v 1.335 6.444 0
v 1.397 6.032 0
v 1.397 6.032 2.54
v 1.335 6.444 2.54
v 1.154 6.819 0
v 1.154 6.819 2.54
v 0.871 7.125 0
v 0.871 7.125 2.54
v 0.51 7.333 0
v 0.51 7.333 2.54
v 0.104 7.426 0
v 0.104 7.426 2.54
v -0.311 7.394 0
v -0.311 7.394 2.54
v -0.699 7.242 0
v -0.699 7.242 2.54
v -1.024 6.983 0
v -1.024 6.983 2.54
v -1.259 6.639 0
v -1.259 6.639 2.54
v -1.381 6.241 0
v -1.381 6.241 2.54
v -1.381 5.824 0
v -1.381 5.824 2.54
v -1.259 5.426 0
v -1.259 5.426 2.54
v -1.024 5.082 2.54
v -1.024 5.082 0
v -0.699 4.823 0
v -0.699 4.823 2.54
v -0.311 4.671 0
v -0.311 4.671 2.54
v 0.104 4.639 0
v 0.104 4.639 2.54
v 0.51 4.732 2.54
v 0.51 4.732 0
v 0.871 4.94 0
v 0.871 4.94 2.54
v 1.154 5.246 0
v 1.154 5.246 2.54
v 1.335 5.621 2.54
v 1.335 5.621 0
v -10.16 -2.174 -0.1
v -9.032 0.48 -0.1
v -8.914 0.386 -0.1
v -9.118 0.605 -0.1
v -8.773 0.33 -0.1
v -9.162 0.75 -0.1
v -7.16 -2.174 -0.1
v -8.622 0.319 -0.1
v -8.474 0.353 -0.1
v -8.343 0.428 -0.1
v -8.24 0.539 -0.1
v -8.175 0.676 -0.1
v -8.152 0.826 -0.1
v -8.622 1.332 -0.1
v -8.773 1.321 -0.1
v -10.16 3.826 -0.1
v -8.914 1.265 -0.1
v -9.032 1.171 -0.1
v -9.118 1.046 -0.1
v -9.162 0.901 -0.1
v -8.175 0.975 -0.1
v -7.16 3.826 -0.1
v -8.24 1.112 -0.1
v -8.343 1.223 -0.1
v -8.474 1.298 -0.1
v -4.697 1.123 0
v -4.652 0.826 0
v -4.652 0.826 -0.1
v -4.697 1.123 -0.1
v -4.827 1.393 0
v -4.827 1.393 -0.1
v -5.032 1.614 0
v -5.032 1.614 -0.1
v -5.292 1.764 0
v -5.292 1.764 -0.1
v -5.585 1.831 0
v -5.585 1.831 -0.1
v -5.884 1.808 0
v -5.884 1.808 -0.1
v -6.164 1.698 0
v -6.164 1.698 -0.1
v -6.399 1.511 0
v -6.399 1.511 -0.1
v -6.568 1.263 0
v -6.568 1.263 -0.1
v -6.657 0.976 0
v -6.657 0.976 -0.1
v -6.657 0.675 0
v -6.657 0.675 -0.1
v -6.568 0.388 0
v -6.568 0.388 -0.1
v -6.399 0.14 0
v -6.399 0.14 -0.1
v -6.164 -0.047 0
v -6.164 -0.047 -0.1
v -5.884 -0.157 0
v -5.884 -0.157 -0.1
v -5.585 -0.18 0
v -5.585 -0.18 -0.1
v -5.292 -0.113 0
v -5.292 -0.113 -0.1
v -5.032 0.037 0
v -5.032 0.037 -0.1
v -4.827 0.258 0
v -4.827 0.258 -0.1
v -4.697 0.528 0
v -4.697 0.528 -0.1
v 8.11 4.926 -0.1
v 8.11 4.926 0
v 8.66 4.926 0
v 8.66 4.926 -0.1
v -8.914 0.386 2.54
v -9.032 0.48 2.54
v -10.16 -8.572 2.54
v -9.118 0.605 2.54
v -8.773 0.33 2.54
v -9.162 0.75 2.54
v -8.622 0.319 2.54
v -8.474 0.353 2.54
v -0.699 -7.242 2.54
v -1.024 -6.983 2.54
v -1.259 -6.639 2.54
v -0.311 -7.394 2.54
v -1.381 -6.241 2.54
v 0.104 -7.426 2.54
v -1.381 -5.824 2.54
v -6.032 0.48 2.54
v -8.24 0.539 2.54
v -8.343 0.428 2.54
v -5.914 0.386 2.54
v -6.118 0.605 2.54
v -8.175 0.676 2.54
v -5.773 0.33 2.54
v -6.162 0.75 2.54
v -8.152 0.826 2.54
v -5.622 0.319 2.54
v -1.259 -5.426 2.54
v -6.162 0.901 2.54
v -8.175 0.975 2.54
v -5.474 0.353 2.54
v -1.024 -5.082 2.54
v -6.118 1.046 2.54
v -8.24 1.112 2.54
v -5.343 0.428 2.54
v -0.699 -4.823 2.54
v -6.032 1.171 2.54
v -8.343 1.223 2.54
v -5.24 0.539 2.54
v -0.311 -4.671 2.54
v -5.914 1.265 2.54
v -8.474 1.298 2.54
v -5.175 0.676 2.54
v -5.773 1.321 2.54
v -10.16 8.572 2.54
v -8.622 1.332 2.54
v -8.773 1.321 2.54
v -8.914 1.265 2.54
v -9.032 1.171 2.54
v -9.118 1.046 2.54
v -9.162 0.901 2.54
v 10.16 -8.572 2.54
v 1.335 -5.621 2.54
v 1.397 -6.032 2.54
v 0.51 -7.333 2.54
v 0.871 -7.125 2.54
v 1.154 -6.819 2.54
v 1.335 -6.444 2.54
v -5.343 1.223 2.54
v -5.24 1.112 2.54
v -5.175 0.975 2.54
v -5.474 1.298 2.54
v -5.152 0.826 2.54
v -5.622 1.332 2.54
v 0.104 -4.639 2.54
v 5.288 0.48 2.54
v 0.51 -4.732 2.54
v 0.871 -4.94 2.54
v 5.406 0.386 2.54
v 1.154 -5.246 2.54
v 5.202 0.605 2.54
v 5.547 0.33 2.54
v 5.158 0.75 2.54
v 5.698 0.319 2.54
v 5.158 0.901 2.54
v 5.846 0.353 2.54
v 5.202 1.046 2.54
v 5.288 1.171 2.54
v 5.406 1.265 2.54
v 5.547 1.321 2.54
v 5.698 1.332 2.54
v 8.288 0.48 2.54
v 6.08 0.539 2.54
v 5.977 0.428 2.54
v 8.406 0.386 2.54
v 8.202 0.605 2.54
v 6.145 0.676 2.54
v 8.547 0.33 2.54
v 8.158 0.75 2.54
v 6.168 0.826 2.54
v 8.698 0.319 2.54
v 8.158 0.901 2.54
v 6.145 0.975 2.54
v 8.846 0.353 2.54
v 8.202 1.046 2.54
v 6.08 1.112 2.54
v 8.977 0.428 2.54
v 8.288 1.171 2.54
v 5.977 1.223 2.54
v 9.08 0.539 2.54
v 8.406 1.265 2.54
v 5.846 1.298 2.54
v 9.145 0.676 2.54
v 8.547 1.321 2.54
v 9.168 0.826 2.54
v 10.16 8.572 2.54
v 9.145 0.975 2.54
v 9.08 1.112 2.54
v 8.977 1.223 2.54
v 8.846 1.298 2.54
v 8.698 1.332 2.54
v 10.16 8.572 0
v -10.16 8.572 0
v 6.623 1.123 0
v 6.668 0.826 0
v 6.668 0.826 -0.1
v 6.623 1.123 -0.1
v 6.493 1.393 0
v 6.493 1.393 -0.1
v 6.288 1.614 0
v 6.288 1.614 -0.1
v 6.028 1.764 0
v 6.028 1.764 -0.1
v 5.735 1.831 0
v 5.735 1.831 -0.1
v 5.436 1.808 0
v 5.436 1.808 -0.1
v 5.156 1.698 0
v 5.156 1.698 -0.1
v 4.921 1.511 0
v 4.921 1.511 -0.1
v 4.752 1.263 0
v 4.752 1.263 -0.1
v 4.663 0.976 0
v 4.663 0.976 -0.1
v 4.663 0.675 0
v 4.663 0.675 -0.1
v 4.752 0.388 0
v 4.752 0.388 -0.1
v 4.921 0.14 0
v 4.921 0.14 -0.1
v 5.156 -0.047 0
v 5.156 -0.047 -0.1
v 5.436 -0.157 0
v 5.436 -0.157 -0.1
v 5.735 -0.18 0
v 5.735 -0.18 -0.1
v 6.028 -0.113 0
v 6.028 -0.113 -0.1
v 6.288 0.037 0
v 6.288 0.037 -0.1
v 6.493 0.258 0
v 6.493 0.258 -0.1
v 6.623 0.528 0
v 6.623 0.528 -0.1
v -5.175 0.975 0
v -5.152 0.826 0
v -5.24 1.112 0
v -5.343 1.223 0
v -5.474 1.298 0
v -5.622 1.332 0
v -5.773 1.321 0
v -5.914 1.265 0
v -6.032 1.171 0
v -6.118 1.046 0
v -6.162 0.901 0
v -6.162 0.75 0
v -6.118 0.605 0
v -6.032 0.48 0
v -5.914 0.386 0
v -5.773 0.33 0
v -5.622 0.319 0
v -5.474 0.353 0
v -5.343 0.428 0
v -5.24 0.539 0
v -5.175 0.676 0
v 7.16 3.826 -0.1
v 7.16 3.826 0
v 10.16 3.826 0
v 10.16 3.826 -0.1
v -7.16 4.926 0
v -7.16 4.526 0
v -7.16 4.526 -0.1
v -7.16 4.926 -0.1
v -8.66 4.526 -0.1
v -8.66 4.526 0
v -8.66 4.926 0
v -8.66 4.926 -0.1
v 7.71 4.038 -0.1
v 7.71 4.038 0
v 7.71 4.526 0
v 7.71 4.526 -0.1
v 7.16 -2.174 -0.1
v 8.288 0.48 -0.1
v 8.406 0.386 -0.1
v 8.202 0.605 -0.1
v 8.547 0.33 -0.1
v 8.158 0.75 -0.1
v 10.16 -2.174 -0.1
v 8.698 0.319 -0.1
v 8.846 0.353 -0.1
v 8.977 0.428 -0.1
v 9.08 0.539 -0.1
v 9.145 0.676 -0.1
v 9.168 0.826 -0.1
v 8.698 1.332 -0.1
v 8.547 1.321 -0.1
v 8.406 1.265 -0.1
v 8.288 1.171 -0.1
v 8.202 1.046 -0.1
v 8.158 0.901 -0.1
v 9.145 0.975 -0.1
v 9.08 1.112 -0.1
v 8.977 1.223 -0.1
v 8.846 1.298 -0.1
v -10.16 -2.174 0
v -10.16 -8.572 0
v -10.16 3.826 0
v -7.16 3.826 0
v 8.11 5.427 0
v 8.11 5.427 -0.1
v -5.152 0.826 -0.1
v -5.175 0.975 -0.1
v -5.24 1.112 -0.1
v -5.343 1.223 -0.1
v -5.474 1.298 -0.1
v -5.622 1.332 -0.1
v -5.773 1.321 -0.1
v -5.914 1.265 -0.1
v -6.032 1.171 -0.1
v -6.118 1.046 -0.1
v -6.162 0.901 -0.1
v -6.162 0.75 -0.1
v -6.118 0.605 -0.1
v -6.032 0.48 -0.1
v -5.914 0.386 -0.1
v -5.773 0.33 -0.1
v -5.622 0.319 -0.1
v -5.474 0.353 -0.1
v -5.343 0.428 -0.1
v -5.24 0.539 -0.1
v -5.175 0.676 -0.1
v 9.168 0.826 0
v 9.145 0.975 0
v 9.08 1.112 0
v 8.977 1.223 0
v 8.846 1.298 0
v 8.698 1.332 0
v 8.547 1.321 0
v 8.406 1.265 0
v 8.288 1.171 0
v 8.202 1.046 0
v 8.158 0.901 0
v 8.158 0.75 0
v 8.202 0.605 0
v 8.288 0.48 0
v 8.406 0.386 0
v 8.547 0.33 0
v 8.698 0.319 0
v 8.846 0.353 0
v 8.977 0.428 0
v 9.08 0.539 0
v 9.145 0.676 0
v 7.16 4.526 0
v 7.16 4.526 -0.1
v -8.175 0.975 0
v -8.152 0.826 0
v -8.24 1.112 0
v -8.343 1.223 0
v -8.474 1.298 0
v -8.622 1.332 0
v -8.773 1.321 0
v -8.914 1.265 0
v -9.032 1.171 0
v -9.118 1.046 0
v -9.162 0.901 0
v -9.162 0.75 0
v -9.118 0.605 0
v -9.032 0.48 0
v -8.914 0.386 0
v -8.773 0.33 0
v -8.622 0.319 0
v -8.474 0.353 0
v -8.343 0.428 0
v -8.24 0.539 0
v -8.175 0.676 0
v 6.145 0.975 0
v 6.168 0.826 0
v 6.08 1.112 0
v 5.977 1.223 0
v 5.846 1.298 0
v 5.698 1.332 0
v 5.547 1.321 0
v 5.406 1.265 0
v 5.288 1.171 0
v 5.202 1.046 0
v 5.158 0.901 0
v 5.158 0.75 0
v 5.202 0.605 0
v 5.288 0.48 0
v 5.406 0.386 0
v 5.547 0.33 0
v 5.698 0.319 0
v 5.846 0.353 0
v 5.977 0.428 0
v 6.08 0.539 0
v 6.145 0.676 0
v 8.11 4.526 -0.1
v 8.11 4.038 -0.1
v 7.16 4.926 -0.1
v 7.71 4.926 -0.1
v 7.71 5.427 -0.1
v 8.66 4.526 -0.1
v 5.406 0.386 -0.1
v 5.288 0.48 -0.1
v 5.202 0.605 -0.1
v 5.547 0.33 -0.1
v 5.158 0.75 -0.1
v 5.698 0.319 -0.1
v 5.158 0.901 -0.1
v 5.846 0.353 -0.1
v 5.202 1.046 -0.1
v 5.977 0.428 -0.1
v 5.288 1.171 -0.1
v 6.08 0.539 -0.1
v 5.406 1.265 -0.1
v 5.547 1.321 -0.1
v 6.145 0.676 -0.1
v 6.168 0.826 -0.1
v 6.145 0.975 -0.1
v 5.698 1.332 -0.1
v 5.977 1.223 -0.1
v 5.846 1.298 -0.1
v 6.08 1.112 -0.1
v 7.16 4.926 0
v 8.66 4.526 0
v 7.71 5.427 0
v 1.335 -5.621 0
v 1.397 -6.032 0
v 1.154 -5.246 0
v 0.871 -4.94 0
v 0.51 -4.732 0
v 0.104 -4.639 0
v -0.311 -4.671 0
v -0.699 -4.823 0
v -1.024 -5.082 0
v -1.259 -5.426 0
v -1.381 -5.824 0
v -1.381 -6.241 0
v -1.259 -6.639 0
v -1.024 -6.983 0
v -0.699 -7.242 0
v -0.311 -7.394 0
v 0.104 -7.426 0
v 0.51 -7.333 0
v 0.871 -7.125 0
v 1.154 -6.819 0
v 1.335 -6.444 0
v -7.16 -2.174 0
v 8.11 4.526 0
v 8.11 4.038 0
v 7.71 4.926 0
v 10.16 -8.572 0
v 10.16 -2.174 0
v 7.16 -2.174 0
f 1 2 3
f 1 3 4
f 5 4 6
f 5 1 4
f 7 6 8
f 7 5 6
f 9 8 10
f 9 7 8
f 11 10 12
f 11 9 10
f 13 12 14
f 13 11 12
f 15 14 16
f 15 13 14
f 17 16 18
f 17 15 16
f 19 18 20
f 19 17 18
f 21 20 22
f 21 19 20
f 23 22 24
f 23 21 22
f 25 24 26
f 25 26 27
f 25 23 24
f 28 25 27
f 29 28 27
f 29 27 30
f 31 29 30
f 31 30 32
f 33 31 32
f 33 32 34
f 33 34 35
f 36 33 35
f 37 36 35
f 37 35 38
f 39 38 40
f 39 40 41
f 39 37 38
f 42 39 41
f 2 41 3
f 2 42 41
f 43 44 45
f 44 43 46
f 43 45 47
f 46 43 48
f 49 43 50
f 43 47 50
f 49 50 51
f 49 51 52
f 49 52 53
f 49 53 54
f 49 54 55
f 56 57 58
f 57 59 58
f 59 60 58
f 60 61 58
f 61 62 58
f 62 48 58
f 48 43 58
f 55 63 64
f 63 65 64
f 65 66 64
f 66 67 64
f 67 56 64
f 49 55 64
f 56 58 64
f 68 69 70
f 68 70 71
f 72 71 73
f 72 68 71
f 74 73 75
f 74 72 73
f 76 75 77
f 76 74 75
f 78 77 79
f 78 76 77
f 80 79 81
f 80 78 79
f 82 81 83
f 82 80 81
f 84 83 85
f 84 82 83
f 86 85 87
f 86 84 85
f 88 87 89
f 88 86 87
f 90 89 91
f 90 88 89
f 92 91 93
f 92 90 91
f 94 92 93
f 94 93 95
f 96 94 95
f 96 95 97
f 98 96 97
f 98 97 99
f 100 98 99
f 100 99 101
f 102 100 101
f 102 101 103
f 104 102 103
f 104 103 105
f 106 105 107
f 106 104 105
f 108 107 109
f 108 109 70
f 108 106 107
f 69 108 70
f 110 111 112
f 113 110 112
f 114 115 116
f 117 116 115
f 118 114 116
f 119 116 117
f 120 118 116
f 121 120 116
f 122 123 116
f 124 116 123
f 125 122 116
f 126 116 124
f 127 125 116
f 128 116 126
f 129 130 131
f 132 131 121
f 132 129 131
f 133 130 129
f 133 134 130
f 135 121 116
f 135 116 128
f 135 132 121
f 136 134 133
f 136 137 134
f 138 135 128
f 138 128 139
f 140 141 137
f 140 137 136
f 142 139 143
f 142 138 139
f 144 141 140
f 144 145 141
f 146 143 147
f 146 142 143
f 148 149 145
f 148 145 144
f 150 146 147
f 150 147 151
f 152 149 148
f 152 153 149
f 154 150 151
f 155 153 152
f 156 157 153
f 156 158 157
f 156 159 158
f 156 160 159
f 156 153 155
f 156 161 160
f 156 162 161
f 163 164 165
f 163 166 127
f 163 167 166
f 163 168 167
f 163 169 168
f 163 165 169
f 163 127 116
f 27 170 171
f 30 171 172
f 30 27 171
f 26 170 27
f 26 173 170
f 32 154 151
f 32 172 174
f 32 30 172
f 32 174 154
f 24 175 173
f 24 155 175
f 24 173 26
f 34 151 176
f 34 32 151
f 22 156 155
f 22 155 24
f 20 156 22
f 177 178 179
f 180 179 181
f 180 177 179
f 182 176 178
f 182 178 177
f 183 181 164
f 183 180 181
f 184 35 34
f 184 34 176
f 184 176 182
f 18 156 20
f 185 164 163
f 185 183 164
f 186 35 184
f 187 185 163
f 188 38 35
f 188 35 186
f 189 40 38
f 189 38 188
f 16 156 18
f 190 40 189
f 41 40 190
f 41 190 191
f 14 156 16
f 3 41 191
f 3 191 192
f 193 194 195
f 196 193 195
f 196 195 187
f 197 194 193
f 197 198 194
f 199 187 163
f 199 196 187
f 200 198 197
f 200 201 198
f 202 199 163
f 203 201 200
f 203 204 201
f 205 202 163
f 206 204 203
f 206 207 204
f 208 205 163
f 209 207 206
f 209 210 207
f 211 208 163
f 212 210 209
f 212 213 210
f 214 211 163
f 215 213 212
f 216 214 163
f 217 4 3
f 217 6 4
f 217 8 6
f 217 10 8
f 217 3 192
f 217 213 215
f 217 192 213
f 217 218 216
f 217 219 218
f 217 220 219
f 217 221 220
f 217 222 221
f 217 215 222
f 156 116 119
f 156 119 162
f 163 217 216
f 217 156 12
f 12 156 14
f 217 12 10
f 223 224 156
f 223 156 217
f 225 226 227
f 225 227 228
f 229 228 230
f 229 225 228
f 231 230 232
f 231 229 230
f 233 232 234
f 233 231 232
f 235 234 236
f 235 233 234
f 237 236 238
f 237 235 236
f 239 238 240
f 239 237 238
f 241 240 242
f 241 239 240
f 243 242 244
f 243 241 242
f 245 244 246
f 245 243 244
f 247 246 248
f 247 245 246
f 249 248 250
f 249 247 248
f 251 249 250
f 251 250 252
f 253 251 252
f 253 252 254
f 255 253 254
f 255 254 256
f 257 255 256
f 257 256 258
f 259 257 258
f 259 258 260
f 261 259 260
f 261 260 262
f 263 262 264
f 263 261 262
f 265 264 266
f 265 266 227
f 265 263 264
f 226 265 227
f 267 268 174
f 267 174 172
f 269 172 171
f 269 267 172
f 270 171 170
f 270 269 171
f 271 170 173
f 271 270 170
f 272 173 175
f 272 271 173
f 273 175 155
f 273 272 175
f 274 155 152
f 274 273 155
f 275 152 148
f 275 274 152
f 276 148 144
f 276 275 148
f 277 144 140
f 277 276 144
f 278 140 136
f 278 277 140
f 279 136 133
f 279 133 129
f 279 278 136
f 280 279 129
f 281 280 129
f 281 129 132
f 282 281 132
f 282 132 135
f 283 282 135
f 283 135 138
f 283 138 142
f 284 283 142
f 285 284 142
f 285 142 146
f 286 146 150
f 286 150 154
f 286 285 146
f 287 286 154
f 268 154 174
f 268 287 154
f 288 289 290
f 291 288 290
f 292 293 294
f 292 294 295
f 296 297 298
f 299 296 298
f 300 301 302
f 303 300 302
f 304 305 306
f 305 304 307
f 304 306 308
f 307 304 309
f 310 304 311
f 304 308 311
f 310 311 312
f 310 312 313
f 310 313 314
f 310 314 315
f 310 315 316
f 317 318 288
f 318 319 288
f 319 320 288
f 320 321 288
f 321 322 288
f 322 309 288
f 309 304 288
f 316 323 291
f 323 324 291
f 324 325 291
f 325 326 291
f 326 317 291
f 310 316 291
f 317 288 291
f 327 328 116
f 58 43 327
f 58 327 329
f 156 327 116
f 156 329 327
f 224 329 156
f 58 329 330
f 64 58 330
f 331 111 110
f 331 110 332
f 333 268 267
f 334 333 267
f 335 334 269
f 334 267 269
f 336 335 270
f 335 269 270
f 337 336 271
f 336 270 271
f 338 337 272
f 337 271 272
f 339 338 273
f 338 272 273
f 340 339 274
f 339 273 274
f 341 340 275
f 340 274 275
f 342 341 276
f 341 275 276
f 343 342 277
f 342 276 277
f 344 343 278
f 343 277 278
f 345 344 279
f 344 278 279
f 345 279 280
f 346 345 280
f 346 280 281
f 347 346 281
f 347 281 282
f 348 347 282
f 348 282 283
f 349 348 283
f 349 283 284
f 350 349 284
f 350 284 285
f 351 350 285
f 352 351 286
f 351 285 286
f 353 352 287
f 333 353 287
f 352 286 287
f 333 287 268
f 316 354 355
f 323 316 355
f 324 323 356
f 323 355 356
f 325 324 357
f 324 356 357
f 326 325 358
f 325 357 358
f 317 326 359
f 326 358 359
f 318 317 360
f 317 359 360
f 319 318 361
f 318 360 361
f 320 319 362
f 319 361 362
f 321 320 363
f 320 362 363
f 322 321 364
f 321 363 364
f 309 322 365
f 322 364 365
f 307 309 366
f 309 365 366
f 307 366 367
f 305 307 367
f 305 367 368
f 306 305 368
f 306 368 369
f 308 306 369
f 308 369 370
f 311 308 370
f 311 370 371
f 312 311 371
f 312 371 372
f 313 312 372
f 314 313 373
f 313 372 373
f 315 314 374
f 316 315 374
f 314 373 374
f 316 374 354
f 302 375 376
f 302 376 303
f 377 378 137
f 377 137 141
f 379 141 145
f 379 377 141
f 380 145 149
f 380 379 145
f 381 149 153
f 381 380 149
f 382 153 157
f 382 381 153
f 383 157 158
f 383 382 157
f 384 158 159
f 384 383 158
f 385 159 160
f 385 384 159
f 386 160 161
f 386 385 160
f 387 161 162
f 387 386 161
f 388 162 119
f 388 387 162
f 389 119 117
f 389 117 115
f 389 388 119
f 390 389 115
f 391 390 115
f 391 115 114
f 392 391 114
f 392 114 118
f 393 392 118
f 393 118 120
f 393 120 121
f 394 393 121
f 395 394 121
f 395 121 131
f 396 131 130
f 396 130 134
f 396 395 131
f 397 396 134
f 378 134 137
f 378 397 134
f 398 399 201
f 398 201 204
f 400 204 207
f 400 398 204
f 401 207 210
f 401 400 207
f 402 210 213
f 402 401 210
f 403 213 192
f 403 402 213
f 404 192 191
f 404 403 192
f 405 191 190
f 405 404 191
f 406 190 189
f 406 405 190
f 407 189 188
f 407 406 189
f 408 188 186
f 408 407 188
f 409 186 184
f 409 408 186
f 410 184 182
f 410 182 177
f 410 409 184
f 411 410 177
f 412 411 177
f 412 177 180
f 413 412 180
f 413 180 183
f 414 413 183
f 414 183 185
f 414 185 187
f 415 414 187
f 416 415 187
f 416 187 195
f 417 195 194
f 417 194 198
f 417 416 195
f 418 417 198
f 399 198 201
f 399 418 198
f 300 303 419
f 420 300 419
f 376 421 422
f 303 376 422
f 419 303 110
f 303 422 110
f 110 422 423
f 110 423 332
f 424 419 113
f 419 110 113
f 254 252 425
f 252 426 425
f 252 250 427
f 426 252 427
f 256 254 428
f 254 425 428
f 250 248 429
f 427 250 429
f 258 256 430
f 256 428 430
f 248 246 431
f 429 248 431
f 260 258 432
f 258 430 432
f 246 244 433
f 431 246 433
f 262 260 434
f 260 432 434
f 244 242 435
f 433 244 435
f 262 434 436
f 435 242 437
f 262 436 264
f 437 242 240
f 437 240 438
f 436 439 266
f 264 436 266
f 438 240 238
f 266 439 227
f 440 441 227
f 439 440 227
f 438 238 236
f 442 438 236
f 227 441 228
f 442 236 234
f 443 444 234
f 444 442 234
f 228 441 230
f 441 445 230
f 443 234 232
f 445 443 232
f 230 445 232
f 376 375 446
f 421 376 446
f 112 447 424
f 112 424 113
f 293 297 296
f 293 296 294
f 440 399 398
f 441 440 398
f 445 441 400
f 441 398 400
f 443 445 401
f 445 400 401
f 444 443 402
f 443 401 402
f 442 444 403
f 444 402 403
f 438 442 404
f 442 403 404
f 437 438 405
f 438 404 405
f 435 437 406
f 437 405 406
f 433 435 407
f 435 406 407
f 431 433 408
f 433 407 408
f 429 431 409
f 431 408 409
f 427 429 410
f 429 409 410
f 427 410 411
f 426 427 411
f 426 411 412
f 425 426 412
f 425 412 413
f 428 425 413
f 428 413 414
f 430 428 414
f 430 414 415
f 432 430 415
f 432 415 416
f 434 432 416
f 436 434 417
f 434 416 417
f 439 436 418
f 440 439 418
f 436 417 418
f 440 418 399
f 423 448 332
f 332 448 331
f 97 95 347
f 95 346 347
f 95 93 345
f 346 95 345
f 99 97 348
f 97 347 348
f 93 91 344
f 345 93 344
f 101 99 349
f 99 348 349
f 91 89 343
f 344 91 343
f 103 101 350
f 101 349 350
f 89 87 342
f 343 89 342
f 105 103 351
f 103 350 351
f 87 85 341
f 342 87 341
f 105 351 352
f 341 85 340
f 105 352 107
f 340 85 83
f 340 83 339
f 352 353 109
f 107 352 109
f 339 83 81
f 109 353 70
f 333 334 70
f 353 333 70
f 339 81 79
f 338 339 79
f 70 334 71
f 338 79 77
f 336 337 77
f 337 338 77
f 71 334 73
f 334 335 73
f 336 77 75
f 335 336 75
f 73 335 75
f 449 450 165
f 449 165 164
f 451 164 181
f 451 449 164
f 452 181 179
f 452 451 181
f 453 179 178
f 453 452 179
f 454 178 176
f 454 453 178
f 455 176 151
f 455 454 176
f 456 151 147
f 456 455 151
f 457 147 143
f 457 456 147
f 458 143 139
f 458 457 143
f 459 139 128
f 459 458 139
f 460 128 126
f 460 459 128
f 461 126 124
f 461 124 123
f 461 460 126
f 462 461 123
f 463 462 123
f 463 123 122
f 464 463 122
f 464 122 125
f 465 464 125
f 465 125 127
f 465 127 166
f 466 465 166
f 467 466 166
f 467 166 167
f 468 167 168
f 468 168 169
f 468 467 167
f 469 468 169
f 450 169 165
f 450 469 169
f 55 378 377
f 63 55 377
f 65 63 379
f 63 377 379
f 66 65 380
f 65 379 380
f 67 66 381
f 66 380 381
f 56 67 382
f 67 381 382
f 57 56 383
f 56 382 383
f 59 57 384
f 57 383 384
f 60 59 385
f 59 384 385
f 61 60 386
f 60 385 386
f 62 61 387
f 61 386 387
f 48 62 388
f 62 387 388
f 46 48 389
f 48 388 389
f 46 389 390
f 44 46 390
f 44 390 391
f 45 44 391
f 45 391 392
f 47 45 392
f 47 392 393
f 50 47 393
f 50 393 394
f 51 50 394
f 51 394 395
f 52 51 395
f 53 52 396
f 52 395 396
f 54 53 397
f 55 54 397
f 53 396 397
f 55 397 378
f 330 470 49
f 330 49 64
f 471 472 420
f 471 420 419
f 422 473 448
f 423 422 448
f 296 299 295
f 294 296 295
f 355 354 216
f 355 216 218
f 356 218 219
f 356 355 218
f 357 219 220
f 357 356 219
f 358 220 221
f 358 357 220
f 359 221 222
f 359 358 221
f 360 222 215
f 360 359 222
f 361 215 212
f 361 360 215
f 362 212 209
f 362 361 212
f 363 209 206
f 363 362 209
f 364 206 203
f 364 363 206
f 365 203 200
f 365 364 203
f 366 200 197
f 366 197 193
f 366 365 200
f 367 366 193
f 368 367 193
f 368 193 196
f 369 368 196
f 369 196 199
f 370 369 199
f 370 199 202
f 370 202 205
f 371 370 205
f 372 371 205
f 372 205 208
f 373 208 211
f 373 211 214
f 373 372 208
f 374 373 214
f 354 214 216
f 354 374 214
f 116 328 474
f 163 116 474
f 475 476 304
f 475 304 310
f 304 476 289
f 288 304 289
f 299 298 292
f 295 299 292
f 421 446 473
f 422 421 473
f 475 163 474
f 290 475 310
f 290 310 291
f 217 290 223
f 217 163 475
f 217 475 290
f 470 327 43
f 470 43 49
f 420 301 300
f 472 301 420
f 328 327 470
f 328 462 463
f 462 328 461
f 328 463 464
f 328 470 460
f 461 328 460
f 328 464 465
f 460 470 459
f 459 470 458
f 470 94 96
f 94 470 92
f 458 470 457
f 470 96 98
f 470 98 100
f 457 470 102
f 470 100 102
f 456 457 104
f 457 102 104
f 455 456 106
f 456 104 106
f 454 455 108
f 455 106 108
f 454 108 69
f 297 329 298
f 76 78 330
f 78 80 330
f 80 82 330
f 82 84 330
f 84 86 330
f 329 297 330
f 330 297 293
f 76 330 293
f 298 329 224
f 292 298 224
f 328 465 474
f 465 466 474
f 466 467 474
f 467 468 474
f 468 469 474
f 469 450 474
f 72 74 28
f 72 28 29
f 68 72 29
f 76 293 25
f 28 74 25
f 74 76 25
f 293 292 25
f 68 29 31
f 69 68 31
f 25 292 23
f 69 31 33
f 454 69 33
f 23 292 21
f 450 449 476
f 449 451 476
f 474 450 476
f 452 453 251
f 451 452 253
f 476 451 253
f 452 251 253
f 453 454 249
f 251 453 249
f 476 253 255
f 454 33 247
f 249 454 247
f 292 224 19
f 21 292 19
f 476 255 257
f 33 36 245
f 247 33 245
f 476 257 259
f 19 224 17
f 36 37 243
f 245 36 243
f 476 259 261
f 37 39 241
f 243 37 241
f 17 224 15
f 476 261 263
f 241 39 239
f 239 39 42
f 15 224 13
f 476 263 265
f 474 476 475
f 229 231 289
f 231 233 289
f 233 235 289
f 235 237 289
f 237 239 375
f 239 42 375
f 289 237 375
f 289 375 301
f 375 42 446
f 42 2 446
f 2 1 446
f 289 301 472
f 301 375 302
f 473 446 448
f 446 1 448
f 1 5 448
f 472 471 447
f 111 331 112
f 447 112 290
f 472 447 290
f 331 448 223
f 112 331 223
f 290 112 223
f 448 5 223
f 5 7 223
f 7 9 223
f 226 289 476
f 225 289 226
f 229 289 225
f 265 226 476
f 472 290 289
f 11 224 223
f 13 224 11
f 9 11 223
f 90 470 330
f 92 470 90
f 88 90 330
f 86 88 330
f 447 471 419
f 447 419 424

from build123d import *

# Parameters (mm, degrees)
SKETCH1_W         = 20.32
SKETCH1_H         = 17.145
SKETCH1_R         = 1.397
SKETCH1_R_2       = 0.508
BOARD_DEPTH       = 2.54
SKETCH2_W         = 3
SKETCH2_H         = 6
SKETCH2_R         = 0.508
SKETCH2_R_2       = 1.008
SKETCH2_W_2       = 1.5
SKETCH2_H_2       = 0.4
SKETCH2_W_3       = 0.4
SKETCH2_H_3       = 1.389517674
SOLDER_PADS_DEPTH = 0.1


with BuildPart() as part:
    # Sketch1 → Board (new body)
    with BuildSketch(Plane.XY):
        Rectangle(SKETCH1_W, SKETCH1_H)
        with Locations((0, -6.0325)):
            Circle(SKETCH1_R, mode=Mode.SUBTRACT)
        with Locations((0, 6.0325)):
            Circle(SKETCH1_R, mode=Mode.SUBTRACT)
        with Locations((-8.66, 0.8255)):
            Circle(SKETCH1_R_2, mode=Mode.SUBTRACT)
        with Locations((8.66, 0.8255)):
            Circle(SKETCH1_R_2, mode=Mode.SUBTRACT)
        with Locations((-5.66, 0.8255)):
            Circle(SKETCH1_R_2, mode=Mode.SUBTRACT)
        with Locations((5.66, 0.8255)):
            Circle(SKETCH1_R_2, mode=Mode.SUBTRACT)
    extrude(amount=BOARD_DEPTH)

    # Sketch2 → Solder Pads (add)
    with BuildSketch(Plane.XY):
        with Locations((8.66, 0.8255)):
            Rectangle(SKETCH2_W, SKETCH2_H)
        with Locations((8.66, 0.8255)):
            Circle(SKETCH2_R, mode=Mode.SUBTRACT)
        with Locations((-8.66, 0.8255)):
            Rectangle(SKETCH2_W, SKETCH2_H)
        with Locations((-8.66, 0.8255)):
            Circle(SKETCH2_R, mode=Mode.SUBTRACT)
        with Locations((5.66, 0.8255)):
            Circle(SKETCH2_R_2)
        with Locations((5.66, 0.8255)):
            Circle(SKETCH2_R, mode=Mode.SUBTRACT)
        with Locations((-5.66, 0.8255)):
            Circle(SKETCH2_R_2)
        with Locations((-5.66, 0.8255)):
            Circle(SKETCH2_R, mode=Mode.SUBTRACT)
        with Locations((7.91, 4.7255)):
            Rectangle(SKETCH2_W_2, SKETCH2_H_2)
        with Locations((7.91, 4.732624026)):
            Rectangle(SKETCH2_W_3, SKETCH2_H_3)
        with Locations((-7.91, 4.7255)):
            Rectangle(SKETCH2_W_2, SKETCH2_H_2)
    extrude(amount=-SOLDER_PADS_DEPTH)


solid = part.part
